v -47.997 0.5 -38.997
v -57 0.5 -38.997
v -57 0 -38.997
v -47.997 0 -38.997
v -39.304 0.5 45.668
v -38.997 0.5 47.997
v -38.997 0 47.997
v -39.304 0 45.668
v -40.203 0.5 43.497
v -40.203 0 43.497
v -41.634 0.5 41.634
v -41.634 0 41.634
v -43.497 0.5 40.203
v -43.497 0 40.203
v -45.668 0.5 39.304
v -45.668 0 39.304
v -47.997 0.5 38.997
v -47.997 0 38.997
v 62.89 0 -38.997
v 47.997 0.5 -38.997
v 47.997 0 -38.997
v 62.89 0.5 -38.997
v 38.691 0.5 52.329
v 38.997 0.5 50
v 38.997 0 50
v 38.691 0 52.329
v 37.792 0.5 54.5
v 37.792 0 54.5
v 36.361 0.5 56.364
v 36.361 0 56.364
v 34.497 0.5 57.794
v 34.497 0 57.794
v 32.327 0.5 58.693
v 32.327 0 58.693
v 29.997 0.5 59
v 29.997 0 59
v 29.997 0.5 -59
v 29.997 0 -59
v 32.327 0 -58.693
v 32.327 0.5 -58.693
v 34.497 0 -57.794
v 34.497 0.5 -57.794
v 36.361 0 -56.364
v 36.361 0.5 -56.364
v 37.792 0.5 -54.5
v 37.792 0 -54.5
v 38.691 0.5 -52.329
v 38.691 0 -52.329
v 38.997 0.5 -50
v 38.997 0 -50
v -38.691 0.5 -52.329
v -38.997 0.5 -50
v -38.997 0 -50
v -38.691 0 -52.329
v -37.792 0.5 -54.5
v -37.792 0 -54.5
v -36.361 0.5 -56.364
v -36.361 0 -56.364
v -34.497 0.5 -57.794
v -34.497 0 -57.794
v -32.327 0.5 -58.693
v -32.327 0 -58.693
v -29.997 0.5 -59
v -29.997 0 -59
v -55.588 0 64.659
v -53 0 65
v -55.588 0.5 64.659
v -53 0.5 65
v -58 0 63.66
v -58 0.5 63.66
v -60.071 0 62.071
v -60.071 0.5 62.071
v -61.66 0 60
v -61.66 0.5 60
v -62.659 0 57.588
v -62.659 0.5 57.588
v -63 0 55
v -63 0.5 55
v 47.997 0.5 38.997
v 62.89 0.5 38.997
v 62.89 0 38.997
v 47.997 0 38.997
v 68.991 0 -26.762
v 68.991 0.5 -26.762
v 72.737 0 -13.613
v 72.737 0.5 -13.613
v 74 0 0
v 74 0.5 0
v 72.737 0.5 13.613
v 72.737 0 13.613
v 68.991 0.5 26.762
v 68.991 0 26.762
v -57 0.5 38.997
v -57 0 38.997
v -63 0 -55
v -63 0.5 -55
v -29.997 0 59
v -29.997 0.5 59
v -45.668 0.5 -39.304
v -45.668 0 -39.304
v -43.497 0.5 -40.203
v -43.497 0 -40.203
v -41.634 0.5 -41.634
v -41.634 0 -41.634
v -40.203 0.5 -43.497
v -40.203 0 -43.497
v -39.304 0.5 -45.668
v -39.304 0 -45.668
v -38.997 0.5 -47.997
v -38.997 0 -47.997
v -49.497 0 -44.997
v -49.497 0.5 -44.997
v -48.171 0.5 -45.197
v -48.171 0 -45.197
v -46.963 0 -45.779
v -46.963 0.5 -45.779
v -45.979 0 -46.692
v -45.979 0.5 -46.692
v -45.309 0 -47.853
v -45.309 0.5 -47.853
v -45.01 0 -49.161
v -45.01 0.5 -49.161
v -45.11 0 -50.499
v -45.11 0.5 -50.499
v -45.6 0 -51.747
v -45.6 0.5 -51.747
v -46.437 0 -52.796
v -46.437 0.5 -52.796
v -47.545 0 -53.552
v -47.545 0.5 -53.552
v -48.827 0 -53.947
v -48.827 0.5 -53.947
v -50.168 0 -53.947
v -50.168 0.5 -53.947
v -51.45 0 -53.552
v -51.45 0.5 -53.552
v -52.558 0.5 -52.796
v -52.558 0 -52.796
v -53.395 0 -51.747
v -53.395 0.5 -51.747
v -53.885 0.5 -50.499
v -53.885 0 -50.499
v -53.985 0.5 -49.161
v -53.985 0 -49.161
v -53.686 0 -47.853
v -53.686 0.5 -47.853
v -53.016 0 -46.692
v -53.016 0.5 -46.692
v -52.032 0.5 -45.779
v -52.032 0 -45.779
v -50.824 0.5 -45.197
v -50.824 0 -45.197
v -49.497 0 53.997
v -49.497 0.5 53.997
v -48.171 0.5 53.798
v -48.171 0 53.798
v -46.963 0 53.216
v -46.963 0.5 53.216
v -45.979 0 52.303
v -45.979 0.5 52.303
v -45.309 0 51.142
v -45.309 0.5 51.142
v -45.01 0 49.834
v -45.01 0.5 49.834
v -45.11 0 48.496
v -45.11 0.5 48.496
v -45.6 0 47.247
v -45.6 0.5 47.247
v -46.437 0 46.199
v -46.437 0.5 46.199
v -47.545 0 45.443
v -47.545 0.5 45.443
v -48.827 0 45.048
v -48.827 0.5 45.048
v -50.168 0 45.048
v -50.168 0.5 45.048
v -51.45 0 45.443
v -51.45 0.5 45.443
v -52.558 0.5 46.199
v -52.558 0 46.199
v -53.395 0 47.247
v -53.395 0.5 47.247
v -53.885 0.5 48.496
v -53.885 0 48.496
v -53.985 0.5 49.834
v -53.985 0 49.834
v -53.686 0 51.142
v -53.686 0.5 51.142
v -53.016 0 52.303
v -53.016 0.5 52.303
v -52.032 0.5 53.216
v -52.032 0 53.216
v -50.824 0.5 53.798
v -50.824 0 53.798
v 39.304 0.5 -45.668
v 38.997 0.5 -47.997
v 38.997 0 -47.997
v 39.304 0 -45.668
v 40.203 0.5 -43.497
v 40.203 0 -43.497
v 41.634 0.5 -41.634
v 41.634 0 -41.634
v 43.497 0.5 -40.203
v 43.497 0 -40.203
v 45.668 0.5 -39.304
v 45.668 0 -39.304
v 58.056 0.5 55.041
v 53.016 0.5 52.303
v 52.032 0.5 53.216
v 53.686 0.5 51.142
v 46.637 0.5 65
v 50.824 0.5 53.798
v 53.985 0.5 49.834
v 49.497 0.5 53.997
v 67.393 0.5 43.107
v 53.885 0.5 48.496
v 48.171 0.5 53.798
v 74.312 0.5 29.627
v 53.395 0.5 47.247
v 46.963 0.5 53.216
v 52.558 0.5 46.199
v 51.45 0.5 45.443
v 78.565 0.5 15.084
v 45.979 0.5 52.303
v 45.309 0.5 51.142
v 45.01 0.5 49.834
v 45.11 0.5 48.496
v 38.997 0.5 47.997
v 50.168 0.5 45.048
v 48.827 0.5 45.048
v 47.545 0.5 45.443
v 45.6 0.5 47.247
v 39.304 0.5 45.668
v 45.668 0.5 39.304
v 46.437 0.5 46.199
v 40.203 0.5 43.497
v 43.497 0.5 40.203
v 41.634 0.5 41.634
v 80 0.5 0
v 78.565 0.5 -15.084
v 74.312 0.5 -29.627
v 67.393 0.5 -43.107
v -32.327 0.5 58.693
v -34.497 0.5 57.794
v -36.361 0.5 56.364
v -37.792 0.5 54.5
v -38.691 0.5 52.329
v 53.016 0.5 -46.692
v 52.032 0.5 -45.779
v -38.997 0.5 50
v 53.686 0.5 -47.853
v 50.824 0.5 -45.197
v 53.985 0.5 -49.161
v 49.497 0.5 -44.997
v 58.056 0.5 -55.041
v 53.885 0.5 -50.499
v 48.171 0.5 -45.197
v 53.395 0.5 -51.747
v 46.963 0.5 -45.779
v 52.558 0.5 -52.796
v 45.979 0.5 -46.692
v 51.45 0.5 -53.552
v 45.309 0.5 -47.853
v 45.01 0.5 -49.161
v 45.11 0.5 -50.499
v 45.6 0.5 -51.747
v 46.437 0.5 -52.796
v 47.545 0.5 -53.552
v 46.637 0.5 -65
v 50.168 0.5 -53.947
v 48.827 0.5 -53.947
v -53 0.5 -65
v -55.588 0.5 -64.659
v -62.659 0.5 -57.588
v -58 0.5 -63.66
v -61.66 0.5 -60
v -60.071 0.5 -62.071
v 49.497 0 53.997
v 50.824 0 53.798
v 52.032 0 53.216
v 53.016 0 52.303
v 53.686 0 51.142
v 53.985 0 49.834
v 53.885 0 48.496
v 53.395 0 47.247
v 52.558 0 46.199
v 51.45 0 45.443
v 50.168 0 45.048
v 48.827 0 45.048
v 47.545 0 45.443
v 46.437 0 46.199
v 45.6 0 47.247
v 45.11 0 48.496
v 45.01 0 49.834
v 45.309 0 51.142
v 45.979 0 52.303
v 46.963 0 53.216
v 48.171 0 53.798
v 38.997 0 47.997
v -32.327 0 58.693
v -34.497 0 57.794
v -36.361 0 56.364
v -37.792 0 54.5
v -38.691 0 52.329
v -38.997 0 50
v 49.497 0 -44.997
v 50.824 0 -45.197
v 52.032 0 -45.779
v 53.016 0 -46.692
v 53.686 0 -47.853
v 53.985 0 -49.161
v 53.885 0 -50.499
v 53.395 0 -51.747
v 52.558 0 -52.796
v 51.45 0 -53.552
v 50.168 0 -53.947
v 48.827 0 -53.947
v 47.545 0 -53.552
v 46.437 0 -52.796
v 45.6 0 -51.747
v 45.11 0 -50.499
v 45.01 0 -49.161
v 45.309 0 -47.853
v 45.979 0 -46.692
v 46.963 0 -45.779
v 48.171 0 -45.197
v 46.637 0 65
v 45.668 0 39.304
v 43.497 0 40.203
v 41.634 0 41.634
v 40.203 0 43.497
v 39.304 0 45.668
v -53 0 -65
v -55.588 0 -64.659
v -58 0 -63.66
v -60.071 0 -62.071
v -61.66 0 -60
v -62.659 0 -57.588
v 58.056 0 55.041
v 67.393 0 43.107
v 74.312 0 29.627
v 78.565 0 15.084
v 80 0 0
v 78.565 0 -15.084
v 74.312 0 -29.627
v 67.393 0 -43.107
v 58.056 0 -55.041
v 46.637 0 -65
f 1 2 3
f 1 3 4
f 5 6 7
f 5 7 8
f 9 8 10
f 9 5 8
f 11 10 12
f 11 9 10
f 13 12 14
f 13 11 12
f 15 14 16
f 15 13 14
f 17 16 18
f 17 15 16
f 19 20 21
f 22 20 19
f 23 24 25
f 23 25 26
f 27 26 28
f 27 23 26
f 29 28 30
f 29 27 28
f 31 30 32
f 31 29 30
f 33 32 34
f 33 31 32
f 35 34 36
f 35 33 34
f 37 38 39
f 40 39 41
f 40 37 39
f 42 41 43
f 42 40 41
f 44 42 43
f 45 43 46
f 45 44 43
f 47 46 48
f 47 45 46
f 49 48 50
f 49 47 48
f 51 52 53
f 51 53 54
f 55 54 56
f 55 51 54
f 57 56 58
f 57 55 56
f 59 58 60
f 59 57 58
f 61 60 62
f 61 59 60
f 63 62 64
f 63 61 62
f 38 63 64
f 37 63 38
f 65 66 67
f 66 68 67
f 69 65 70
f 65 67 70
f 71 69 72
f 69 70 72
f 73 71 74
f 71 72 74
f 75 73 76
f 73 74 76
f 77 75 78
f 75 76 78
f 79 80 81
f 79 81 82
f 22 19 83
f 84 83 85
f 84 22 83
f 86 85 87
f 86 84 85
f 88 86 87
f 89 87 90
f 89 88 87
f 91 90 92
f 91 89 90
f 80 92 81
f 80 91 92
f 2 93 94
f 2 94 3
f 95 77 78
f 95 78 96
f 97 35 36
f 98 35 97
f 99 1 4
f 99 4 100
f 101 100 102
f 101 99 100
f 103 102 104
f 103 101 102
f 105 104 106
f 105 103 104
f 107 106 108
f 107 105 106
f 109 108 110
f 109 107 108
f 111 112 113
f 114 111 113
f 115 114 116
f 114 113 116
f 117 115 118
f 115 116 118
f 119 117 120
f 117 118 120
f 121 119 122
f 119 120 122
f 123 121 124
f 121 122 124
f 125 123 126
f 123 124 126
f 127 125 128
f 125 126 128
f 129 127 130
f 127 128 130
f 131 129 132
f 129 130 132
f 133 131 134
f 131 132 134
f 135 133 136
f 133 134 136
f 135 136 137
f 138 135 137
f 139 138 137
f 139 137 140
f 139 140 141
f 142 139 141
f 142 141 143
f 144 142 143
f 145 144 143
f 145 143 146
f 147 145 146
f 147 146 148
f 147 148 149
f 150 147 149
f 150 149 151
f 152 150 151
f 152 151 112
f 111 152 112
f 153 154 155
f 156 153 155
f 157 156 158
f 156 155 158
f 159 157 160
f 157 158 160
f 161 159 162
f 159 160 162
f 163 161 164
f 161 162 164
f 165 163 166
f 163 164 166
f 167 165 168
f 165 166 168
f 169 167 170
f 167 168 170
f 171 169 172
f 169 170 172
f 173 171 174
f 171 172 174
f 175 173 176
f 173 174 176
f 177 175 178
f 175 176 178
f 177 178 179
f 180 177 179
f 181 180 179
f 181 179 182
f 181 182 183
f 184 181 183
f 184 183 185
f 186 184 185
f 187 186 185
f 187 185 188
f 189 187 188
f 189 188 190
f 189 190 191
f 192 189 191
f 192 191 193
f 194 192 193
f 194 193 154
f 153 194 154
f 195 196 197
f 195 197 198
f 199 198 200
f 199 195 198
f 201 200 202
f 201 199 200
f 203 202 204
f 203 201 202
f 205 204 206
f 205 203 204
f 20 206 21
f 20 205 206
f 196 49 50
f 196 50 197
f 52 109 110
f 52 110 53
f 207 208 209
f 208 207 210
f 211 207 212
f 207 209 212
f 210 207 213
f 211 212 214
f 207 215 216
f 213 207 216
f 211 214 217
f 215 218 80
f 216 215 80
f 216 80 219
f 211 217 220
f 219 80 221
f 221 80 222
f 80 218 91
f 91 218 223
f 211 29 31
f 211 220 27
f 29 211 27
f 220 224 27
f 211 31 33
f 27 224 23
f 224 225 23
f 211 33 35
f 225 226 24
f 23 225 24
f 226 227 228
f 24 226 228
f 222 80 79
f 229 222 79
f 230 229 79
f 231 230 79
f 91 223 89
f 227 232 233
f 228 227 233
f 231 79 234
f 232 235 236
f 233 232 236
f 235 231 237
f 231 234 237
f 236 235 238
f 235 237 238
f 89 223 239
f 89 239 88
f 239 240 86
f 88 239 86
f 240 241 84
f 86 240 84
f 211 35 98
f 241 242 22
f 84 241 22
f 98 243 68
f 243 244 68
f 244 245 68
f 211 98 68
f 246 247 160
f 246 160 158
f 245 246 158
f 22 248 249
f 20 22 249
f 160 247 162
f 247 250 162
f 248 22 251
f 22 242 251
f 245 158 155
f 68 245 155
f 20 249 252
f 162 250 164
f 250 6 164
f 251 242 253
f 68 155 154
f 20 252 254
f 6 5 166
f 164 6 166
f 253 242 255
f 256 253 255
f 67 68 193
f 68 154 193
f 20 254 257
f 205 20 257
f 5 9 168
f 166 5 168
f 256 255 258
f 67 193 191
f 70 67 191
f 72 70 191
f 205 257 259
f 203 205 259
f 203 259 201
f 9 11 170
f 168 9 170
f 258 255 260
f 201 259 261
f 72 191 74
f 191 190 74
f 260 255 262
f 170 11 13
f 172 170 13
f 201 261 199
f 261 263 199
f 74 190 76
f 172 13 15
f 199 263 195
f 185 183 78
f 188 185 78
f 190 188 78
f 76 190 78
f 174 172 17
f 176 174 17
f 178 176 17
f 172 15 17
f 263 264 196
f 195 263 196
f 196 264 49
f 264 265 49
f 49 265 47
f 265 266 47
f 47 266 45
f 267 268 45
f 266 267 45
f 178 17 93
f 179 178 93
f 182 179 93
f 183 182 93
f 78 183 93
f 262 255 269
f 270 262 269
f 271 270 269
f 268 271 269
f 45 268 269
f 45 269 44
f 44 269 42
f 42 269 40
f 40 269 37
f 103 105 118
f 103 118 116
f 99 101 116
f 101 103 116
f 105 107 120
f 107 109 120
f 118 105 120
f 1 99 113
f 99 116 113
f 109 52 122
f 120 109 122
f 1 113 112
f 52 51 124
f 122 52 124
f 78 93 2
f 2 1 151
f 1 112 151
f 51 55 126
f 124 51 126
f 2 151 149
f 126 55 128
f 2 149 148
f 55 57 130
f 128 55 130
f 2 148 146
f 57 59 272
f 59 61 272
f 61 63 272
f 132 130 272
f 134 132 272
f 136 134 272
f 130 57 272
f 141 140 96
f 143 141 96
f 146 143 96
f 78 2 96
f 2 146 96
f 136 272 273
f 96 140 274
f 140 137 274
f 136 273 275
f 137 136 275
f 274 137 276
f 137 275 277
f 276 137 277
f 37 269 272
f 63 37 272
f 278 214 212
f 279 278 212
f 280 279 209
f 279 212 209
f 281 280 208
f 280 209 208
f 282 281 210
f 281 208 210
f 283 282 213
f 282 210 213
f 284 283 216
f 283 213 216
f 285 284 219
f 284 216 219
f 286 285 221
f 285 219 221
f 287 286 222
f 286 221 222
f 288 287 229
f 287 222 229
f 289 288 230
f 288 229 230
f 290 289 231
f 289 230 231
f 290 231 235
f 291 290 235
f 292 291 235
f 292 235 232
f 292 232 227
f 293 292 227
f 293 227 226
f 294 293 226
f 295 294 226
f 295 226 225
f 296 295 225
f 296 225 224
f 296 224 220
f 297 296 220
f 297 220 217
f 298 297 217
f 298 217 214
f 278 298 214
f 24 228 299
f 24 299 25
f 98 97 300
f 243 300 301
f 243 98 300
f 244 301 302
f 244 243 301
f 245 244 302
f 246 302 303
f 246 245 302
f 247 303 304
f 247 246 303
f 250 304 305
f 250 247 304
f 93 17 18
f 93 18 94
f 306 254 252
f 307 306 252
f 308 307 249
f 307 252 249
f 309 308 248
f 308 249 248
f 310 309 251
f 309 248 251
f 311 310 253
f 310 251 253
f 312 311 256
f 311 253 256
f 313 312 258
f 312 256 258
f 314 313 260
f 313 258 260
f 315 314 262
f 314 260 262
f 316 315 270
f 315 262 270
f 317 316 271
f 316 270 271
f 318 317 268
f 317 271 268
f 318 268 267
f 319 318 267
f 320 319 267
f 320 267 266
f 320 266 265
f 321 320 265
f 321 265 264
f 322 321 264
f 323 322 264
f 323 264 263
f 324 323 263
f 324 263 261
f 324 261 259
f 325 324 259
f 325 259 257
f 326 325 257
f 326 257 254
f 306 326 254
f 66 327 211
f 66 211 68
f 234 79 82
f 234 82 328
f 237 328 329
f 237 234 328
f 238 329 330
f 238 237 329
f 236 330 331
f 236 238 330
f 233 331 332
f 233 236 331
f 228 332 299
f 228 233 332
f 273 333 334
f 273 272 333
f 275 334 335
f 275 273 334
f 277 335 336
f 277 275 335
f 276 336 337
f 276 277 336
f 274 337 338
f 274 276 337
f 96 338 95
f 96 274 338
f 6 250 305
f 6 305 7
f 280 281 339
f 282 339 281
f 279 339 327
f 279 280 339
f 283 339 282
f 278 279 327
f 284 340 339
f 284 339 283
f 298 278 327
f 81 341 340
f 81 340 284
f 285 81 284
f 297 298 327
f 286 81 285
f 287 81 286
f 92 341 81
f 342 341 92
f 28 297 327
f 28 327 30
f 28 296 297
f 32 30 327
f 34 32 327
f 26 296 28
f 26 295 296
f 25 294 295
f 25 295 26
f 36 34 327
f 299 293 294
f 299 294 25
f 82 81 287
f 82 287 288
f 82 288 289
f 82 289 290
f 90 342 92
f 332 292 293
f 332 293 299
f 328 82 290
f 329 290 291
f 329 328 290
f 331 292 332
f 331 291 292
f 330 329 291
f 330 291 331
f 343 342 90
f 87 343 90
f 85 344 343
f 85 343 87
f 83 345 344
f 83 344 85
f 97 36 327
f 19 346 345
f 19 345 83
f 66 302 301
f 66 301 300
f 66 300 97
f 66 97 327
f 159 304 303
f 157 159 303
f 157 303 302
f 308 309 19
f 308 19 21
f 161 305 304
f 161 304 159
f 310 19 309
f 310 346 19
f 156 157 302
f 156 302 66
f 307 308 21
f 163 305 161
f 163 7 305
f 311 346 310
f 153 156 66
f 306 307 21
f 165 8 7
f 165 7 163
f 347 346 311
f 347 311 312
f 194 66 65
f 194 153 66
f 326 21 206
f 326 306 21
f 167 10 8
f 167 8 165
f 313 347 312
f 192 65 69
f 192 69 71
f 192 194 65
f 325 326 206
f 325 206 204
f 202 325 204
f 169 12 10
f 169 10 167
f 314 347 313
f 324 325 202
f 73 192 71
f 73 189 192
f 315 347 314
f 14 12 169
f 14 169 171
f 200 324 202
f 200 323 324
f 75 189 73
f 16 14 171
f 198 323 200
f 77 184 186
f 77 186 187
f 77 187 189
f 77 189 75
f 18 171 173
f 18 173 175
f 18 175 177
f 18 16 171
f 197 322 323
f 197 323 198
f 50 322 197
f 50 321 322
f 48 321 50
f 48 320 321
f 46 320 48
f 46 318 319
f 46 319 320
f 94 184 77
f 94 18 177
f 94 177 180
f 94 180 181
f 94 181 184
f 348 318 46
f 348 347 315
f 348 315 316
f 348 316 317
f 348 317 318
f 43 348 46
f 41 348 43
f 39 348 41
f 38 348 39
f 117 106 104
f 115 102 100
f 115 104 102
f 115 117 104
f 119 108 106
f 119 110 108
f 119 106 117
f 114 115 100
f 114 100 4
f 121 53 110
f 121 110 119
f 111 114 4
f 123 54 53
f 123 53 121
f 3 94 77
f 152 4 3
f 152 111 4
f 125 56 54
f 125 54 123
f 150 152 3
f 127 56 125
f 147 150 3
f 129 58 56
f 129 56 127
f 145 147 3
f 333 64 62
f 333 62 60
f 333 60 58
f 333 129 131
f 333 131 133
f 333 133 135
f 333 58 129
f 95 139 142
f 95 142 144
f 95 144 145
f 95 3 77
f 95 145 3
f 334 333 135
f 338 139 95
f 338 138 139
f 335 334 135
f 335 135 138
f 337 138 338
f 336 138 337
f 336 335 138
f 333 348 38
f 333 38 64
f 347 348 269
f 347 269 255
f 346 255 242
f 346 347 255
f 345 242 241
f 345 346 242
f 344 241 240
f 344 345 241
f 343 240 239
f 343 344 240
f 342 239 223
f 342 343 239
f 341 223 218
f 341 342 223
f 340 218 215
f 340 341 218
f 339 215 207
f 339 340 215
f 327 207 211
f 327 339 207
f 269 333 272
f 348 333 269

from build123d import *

# Parameters (mm, degrees)
BOSS_EXTRUDE1_DEPTH = 0.5
FILLET1_R           = 10
SKETCH27_R          = 4.5
CUT_EXTRUDE9_DEPTH  = 104.078853311
CUT_EXTRUDE17_DEPTH = 104.078853311


with BuildPart() as part:
    # Sketch1 → Boss-Extrude1 (new body)
    with BuildSketch(Plane(origin=(0, 0, 0), x_dir=(1, 0, 0), z_dir=(0, 1, 0))):
        with BuildLine():
            Line((-63, 65), (46.636895265, 65))
            ThreePointArc((46.636895265, 65), (80, 0), (46.636895265, -65))
            Line((46.636895265, -65), (-63, -65))
            Line((-63, -65), (-63, 65))
        make_face()
    extrude(amount=BOSS_EXTRUDE1_DEPTH)

    # Fillet1
    fillet1_edges = [part.edges().sort_by_distance(p)[0] for p in [
        (-63, 0.25, -65),
        (-63, 0.25, 65),
    ]]
    fillet(fillet1_edges, radius=FILLET1_R)

    # Sketch27 → Cut-Extrude9 (cut, through all)
    with BuildSketch(Plane(origin=(0, 0.5, 0), x_dir=(1, 0, 0), z_dir=(0, 1, 0))):
        with Locations(Location((-49.497474683, -49.497474683, 0), (0, 0, 270))):
            Circle(SKETCH27_R)
        with Locations(Location((49.497474683, -49.497474683, 0), (0, 0, 270))):
            Circle(SKETCH27_R)
        with Locations(Location((49.497474683, 49.497474683, 0), (0, 0, 270))):
            Circle(SKETCH27_R)
        with Locations(Location((-49.497474683, 49.497474683, 0), (0, 0, 270))):
            Circle(SKETCH27_R)
    extrude(amount=-CUT_EXTRUDE9_DEPTH, mode=Mode.SUBTRACT)

    # Sketch44 → Cut-Extrude17 (cut, through all)
    with BuildSketch(Plane(origin=(0, 0.5, 0), x_dir=(1, 0, 0), z_dir=(0, 1, 0))):
        with BuildLine():
            Line((47.997474683, 38.997474683), (62.89035672, 38.997474683))
            ThreePointArc((62.89035672, 38.997474683), (74, 0), (62.89035672, -38.997474683))
            Line((62.89035672, -38.997474683), (47.997474683, -38.997474683))
            ThreePointArc((47.997474683, -38.997474683), (41.633513652, -41.633513652), (38.997474683, -47.997474683))
            Line((38.997474683, -47.997474683), (38.997474683, -50))
            ThreePointArc((38.997474683, -50), (36.361435714, -56.363961031), (29.997474683, -59))
            Line((29.997474683, -59), (-29.997474683, -59))
            ThreePointArc((-29.997474683, -59), (-36.361435714, -56.363961031), (-38.997474683, -50))
            Line((-38.997474683, -50), (-38.997474683, -47.997474683))
            ThreePointArc((-38.997474683, -47.997474683), (-41.633513652, -41.633513652), (-47.997474683, -38.997474683))
            Line((-47.997474683, -38.997474683), (-57, -38.997474683))
            Line((-57, -38.997474683), (-57, 38.997474683))
            Line((-57, 38.997474683), (-47.997474683, 38.997474683))
            ThreePointArc((-47.997474683, 38.997474683), (-41.633513652, 41.633513652), (-38.997474683, 47.997474683))
            Line((-38.997474683, 47.997474683), (-38.997474683, 50))
            ThreePointArc((-38.997474683, 50), (-36.361435714, 56.363961031), (-29.997474683, 59))
            Line((-29.997474683, 59), (29.997474683, 59))
            ThreePointArc((29.997474683, 59), (36.361435714, 56.363961031), (38.997474683, 50))
            Line((38.997474683, 50), (38.997474683, 47.997474683))
            ThreePointArc((38.997474683, 47.997474683), (41.633513652, 41.633513652), (47.997474683, 38.997474683))
        make_face()
    extrude(amount=-CUT_EXTRUDE17_DEPTH, mode=Mode.SUBTRACT)


solid = part.part
